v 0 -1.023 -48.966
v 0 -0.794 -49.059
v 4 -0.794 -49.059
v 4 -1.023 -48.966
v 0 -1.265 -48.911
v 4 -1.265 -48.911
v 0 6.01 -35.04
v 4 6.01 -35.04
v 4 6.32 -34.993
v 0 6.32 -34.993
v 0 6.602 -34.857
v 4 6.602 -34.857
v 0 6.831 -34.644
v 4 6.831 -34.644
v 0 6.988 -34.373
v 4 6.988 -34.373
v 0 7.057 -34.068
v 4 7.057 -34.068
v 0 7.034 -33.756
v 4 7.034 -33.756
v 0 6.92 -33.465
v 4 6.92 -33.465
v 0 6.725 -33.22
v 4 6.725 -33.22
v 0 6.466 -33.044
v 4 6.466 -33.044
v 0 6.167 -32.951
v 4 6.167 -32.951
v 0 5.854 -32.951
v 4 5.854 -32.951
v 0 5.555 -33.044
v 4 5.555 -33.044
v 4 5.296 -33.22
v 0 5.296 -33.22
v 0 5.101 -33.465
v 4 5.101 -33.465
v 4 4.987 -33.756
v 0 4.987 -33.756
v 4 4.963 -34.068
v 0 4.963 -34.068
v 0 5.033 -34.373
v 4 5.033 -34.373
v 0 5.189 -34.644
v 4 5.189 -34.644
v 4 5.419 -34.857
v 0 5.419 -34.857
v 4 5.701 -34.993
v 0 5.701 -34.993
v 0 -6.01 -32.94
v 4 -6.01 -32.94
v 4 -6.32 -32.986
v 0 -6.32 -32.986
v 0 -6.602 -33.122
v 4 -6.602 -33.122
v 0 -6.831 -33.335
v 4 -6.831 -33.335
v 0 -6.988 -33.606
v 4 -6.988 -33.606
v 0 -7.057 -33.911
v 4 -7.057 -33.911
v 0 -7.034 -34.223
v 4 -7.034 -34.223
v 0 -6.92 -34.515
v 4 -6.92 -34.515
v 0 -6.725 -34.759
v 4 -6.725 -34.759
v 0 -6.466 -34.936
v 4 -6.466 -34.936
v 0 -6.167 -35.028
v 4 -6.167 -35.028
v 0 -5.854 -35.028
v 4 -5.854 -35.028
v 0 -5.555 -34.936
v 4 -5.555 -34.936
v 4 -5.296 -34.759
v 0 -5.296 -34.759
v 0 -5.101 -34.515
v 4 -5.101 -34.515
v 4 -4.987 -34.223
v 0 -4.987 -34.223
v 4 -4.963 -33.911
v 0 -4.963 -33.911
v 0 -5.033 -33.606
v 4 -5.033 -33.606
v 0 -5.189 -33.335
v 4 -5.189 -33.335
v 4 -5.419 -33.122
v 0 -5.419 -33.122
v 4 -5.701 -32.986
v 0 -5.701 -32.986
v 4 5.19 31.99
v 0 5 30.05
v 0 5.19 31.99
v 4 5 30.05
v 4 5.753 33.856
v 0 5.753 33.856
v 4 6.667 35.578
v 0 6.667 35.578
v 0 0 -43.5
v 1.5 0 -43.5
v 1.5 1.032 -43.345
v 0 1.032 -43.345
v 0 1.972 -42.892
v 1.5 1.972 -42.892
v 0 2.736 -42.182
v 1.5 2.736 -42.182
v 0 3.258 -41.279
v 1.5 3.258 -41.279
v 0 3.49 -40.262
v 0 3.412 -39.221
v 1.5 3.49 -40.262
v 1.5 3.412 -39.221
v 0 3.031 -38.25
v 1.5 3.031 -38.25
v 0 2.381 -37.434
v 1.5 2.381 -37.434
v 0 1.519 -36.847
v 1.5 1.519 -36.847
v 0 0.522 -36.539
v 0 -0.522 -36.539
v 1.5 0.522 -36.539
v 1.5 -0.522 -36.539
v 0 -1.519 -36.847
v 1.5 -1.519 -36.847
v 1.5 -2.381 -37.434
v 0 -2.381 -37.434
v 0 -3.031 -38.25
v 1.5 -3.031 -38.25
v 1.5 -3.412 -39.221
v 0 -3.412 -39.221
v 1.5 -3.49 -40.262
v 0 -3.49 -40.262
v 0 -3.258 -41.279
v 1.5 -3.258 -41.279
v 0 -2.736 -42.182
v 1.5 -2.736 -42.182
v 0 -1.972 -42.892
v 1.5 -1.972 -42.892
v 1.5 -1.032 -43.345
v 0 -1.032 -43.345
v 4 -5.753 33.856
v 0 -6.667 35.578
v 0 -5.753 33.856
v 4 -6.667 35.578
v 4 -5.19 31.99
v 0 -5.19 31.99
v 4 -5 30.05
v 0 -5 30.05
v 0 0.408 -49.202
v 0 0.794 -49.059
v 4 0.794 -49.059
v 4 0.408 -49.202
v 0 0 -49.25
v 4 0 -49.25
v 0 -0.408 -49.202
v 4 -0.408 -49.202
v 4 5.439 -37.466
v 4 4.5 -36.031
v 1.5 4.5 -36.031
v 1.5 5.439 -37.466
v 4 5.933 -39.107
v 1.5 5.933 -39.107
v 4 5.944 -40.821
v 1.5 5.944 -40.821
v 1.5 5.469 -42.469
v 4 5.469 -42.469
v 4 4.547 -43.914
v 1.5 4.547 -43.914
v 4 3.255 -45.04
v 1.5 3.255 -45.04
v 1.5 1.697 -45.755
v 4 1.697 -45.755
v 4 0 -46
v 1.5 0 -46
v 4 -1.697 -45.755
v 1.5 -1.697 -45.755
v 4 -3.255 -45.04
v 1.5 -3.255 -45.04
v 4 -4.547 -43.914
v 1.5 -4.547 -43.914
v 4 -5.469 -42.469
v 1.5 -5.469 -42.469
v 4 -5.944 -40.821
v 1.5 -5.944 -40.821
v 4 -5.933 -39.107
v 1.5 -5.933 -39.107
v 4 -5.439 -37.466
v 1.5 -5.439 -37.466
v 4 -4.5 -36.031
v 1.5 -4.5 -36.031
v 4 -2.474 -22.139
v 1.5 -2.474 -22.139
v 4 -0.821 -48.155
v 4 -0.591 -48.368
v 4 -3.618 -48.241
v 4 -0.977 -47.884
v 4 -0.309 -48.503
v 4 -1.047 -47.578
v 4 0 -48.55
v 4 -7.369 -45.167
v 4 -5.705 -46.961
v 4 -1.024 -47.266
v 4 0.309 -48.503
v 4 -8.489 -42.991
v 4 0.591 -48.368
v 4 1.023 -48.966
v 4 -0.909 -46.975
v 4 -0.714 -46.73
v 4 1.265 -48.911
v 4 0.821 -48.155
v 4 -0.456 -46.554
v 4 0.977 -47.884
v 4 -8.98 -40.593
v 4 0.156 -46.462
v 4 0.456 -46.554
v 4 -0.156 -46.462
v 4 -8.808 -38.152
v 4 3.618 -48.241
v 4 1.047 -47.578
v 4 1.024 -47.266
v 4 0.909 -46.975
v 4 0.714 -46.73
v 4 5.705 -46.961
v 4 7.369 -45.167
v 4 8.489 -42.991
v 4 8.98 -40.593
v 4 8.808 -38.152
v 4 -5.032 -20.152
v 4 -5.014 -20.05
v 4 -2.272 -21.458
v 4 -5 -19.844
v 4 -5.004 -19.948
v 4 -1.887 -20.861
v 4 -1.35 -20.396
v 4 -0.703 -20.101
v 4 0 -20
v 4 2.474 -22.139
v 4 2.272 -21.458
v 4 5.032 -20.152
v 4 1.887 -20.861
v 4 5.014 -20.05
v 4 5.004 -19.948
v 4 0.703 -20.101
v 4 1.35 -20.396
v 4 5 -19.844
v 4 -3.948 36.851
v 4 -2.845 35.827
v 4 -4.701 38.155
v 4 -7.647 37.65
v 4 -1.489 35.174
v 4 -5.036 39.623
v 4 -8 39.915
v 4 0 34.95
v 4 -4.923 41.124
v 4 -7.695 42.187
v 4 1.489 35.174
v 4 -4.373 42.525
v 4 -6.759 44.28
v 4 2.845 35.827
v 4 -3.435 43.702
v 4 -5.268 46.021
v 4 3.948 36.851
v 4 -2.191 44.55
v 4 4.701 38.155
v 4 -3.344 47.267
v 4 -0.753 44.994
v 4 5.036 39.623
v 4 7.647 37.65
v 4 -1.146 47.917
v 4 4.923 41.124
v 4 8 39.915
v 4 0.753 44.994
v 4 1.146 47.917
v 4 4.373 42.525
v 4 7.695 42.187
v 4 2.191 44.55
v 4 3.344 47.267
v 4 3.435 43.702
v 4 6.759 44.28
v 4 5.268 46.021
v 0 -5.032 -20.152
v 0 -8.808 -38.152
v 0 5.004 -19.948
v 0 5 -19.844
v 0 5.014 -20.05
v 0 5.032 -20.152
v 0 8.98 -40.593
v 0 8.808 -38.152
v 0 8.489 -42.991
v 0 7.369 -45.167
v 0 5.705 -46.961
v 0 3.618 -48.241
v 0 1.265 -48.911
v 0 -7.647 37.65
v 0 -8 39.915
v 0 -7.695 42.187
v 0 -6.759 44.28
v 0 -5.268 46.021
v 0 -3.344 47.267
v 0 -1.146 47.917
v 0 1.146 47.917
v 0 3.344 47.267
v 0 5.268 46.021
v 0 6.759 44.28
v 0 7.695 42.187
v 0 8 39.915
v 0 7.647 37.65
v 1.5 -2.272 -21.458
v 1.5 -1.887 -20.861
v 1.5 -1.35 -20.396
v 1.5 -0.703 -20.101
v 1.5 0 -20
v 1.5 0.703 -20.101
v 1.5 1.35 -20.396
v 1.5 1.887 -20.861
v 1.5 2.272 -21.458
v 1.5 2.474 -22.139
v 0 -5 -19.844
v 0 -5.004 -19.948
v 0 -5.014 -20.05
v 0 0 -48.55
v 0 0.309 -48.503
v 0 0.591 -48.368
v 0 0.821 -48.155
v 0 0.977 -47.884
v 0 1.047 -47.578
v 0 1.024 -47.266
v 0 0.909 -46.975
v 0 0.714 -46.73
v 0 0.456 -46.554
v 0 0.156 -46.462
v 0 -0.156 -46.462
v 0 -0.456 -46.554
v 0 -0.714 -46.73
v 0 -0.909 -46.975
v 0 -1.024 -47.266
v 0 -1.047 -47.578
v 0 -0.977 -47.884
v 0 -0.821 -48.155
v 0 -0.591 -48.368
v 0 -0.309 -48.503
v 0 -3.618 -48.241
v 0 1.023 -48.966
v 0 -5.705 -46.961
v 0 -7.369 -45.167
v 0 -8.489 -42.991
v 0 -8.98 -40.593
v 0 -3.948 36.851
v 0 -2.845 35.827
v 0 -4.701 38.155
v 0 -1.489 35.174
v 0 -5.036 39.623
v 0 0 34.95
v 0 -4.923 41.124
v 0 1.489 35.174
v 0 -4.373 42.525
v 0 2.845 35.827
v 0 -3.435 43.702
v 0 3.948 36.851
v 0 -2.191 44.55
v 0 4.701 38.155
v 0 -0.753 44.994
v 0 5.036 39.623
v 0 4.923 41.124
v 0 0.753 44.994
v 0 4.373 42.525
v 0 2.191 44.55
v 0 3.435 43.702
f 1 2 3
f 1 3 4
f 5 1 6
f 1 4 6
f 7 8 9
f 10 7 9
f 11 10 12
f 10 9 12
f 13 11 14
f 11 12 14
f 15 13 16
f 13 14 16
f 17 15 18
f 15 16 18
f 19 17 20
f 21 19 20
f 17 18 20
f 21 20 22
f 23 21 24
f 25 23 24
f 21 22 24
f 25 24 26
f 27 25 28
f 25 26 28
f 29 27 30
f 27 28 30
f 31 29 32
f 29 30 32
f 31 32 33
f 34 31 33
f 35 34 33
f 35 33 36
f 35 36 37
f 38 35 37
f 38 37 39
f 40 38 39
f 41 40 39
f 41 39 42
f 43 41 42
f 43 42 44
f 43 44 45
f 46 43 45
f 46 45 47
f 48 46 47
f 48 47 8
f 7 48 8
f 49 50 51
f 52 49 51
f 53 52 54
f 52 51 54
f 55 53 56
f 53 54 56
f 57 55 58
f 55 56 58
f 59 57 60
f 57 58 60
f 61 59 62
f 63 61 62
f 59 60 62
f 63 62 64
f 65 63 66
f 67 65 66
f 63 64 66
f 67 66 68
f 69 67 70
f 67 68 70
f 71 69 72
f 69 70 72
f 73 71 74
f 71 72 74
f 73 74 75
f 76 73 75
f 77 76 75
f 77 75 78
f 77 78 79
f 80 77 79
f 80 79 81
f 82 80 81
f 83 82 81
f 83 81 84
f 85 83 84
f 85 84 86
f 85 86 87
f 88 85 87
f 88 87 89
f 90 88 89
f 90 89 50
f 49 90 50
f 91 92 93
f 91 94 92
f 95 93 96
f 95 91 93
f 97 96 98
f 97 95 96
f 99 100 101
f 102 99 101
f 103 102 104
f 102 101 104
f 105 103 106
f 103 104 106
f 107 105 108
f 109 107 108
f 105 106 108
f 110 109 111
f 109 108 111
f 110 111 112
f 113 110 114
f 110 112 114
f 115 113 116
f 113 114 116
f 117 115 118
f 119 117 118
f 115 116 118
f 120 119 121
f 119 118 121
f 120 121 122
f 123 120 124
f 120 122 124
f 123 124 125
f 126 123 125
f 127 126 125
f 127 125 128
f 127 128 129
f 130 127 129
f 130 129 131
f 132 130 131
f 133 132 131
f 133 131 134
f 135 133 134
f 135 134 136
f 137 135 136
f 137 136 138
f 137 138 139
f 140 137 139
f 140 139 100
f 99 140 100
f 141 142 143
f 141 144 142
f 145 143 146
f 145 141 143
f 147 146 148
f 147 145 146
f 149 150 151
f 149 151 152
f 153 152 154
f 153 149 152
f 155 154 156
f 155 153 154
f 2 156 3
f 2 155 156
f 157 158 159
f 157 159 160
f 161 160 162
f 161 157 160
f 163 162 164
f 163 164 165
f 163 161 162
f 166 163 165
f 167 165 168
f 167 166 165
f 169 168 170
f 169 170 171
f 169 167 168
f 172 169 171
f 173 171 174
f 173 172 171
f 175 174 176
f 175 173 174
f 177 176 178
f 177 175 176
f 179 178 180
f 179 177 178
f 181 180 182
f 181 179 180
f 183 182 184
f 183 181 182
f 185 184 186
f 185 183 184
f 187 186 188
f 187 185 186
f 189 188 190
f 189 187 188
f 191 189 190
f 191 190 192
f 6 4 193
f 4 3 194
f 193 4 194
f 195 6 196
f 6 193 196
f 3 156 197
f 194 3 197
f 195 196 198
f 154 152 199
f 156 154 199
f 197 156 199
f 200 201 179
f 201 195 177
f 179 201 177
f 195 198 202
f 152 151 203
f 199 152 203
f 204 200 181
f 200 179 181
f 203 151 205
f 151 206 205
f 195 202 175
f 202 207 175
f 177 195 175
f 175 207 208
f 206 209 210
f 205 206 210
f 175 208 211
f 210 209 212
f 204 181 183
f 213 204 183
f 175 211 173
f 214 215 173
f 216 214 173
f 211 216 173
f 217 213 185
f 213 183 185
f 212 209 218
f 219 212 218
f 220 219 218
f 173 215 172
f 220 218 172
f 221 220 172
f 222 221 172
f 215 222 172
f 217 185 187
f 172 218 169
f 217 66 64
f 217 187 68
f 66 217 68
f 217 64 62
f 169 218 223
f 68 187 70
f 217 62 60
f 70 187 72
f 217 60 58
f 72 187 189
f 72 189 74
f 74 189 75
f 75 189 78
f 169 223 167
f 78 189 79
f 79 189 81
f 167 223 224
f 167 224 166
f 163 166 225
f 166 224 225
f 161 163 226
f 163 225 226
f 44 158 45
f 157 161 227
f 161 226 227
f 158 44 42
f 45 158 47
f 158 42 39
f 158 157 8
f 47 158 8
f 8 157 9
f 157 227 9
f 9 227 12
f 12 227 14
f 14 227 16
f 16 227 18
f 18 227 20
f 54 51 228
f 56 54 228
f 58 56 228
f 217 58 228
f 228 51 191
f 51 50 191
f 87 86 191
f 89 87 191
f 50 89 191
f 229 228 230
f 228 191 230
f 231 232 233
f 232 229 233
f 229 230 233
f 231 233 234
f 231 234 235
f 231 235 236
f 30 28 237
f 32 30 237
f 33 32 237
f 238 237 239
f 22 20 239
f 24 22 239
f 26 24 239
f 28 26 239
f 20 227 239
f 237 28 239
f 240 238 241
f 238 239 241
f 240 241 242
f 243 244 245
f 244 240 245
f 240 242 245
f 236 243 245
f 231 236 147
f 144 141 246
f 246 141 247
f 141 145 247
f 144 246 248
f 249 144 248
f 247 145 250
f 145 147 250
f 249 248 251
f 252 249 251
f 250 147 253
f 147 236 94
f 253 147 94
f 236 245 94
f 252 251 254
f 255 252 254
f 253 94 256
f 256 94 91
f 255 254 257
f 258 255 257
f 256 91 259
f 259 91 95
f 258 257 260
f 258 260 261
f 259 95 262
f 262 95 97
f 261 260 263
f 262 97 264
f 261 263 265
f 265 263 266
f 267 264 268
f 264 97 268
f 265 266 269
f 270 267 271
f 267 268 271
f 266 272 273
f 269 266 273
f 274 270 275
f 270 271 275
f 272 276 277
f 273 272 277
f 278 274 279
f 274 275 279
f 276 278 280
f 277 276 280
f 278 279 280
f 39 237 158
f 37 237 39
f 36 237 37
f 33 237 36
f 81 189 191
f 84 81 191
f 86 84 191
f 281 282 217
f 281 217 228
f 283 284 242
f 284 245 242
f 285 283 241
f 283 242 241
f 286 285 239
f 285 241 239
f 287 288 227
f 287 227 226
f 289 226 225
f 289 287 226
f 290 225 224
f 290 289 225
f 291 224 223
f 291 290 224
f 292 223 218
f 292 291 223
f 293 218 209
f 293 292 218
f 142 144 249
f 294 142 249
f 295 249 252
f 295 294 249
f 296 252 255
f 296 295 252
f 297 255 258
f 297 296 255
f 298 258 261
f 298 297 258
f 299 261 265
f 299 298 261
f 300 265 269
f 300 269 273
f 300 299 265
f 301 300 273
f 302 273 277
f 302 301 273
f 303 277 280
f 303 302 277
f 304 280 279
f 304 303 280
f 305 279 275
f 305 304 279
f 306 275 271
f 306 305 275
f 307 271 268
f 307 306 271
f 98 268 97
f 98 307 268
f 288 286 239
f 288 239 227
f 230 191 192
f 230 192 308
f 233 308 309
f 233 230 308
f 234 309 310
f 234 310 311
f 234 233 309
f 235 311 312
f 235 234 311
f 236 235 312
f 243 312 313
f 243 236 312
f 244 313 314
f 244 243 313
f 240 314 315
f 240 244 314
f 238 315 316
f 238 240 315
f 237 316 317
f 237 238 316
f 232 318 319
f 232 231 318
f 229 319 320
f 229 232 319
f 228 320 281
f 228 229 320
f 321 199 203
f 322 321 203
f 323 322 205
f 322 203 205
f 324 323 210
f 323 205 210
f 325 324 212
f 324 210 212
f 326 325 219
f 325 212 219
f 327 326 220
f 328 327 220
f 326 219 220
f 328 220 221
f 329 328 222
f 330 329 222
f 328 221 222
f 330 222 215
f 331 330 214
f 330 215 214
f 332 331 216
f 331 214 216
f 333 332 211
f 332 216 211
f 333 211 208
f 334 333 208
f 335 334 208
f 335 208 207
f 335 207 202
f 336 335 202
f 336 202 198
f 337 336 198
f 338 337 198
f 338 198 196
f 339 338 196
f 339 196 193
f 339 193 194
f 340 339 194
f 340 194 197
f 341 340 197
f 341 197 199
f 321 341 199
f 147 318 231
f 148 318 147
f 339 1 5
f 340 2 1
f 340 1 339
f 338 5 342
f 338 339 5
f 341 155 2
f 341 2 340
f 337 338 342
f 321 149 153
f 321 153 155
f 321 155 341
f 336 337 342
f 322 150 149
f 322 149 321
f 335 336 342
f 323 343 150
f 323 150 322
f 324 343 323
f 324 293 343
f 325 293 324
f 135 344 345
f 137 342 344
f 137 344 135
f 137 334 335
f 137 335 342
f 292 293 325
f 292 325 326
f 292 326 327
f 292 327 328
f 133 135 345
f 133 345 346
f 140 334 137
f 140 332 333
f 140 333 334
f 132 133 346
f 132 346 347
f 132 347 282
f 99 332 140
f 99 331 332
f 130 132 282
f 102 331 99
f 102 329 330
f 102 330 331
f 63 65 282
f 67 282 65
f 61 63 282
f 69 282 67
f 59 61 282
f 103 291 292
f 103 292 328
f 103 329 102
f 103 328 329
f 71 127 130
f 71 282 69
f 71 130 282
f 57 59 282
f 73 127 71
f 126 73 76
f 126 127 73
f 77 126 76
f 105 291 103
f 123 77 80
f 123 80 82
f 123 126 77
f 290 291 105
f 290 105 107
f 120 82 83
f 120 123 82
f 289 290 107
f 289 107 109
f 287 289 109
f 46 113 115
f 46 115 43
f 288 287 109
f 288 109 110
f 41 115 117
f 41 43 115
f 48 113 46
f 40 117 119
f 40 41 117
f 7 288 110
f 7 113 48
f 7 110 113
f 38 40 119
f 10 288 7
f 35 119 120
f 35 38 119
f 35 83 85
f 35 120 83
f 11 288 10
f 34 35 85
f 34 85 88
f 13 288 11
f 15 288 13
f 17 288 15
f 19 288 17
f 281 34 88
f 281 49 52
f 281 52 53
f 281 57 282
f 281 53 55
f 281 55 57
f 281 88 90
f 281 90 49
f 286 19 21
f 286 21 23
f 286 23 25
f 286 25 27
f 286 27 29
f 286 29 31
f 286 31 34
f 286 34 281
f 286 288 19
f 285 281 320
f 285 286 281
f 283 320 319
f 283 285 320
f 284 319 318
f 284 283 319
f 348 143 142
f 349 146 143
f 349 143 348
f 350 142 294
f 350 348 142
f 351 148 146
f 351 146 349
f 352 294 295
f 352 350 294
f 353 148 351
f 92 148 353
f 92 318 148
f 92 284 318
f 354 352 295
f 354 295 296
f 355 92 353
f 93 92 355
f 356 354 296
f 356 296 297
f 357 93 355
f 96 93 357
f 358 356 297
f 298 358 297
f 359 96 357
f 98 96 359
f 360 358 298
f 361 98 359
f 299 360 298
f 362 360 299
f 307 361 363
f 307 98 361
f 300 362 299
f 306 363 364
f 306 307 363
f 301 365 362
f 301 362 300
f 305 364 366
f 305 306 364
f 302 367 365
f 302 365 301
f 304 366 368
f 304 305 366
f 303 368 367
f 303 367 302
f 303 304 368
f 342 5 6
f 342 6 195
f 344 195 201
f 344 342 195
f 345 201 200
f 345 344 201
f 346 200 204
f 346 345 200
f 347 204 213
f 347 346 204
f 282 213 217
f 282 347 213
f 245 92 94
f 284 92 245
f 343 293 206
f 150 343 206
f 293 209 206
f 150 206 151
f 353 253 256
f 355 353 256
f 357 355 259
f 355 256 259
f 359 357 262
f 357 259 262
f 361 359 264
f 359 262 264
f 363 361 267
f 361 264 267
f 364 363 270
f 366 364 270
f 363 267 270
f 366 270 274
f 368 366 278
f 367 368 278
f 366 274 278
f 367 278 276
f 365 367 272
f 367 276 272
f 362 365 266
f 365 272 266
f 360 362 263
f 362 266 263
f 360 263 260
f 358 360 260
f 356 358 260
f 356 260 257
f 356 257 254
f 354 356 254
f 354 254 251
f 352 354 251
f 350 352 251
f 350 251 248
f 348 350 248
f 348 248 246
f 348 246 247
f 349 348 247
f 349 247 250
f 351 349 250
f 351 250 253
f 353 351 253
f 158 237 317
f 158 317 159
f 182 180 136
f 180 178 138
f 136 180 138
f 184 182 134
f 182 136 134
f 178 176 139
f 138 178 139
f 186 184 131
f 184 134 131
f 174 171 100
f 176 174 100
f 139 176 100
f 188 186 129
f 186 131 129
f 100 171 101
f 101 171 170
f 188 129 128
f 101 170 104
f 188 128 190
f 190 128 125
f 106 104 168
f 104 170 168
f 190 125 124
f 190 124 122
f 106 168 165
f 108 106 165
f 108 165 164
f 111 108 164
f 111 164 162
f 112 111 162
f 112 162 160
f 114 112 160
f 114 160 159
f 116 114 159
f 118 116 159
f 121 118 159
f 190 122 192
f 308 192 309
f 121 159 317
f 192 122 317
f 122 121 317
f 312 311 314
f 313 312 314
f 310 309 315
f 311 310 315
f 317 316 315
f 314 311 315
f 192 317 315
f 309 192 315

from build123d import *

# Parameters (mm, degrees)
BOSS_EXTRU_1_DEPTH      = 4
ESQUISSE2_R             = 5.05
ESQUISSE2_R_2           = 3.5
ENL_V_MAT_EXTRU_1_DEPTH = 10
ENL_V_MAT_EXTRU_2_DEPTH = 2.5
ESQUISSE5_R             = 1.05
ENL_V_MAT_EXTRU_3_DEPTH = 51.225118218
CONG_2_R                = 1.5
CONG_3_R                = 10


with BuildPart() as part:
    # Esquisse1 → Boss.-Extru.1 (new body)
    with BuildSketch(Plane(origin=(0, 0, 0), x_dir=(0, 0, -1), z_dir=(1, 0, 0))):
        with BuildLine():
            Line((-33.755002002, 5), (20, 5))
            Line((20, 5), (38.152060387, 8.808241549))
            ThreePointArc((38.152060387, 8.808241549), (45.281301679, 7.28751347), (48.945833333, 0.985934061))
            ThreePointArc((48.945833333, 0.985934061), (49.25, 0), (48.945833333, -0.985934061))
            ThreePointArc((48.945833333, -0.985934061), (45.281301679, -7.28751347), (38.152060387, -8.808241549))
            Line((38.152060387, -8.808241549), (20, -5))
            Line((20, -5), (-33.755002002, -5))
            ThreePointArc((-33.755002002, -5), (-48, 0), (-33.755002002, 5))
        make_face()
    extrude(amount=BOSS_EXTRU_1_DEPTH)

    # Esquisse2 → Enlèv. mat.-Extru.1 (cut)
    with BuildSketch(Plane(origin=(4, 0, 0), x_dir=(0, 0, -1), z_dir=(1, 0, 0))):
        with Locations((-40, 0)):
            Circle(ESQUISSE2_R)
        with Locations((40, 0)):
            Circle(ESQUISSE2_R_2)
    extrude(amount=-ENL_V_MAT_EXTRU_1_DEPTH, mode=Mode.SUBTRACT)

    # Esquisse3 → Enlèv. mat.-Extru.2 (cut)
    with BuildSketch(Plane(origin=(4, 0, 0), x_dir=(0, 0, -1), z_dir=(1, 0, 0))):
        with BuildLine():
            Line((22.139192589, 2.473826593), (36.031373033, 4.5))
            ThreePointArc((36.031373033, 4.5), (46, 0), (36.031373033, -4.5))
            Line((36.031373033, -4.5), (22.139192589, -2.473826593))
            ThreePointArc((22.139192589, -2.473826593), (20, 0), (22.139192589, 2.473826593))
        make_face()
    extrude(amount=-ENL_V_MAT_EXTRU_2_DEPTH, mode=Mode.SUBTRACT)

    # Esquisse5 → Enlèv. mat.-Extru.3 (cut, through all)
    with BuildSketch(Plane(origin=(4, 0, 0), x_dir=(0, 0, -1), z_dir=(1, 0, 0))):
        with Locations((33.98959236, 6.01040764)):
            Circle(ESQUISSE5_R)
        with Locations(Location((33.98959236, -6.01040764, 0), (0, 0, 180))):
            Circle(ESQUISSE5_R)
        with Locations((47.5, 0)):
            Circle(ESQUISSE5_R)
    extrude(amount=-ENL_V_MAT_EXTRU_3_DEPTH, mode=Mode.SUBTRACT)

    # Congé2
    cong_2_edges = [part.edges().sort_by_distance(p)[0] for p in [
        (2, -0.985934061, -48.945833333),
        (2, -5, -20),
        (2, 5, -20),
        (2, 0.985934061, -48.945833333),
    ]]
    fillet(cong_2_edges, radius=CONG_2_R)

    # Congé3
    cong_3_edges = [part.edges().sort_by_distance(p)[0] for p in [
        (2, -5, 33.755002002),
        (2, 5, 33.755002002),
    ]]
    fillet(cong_3_edges, radius=CONG_3_R)


solid = part.part
